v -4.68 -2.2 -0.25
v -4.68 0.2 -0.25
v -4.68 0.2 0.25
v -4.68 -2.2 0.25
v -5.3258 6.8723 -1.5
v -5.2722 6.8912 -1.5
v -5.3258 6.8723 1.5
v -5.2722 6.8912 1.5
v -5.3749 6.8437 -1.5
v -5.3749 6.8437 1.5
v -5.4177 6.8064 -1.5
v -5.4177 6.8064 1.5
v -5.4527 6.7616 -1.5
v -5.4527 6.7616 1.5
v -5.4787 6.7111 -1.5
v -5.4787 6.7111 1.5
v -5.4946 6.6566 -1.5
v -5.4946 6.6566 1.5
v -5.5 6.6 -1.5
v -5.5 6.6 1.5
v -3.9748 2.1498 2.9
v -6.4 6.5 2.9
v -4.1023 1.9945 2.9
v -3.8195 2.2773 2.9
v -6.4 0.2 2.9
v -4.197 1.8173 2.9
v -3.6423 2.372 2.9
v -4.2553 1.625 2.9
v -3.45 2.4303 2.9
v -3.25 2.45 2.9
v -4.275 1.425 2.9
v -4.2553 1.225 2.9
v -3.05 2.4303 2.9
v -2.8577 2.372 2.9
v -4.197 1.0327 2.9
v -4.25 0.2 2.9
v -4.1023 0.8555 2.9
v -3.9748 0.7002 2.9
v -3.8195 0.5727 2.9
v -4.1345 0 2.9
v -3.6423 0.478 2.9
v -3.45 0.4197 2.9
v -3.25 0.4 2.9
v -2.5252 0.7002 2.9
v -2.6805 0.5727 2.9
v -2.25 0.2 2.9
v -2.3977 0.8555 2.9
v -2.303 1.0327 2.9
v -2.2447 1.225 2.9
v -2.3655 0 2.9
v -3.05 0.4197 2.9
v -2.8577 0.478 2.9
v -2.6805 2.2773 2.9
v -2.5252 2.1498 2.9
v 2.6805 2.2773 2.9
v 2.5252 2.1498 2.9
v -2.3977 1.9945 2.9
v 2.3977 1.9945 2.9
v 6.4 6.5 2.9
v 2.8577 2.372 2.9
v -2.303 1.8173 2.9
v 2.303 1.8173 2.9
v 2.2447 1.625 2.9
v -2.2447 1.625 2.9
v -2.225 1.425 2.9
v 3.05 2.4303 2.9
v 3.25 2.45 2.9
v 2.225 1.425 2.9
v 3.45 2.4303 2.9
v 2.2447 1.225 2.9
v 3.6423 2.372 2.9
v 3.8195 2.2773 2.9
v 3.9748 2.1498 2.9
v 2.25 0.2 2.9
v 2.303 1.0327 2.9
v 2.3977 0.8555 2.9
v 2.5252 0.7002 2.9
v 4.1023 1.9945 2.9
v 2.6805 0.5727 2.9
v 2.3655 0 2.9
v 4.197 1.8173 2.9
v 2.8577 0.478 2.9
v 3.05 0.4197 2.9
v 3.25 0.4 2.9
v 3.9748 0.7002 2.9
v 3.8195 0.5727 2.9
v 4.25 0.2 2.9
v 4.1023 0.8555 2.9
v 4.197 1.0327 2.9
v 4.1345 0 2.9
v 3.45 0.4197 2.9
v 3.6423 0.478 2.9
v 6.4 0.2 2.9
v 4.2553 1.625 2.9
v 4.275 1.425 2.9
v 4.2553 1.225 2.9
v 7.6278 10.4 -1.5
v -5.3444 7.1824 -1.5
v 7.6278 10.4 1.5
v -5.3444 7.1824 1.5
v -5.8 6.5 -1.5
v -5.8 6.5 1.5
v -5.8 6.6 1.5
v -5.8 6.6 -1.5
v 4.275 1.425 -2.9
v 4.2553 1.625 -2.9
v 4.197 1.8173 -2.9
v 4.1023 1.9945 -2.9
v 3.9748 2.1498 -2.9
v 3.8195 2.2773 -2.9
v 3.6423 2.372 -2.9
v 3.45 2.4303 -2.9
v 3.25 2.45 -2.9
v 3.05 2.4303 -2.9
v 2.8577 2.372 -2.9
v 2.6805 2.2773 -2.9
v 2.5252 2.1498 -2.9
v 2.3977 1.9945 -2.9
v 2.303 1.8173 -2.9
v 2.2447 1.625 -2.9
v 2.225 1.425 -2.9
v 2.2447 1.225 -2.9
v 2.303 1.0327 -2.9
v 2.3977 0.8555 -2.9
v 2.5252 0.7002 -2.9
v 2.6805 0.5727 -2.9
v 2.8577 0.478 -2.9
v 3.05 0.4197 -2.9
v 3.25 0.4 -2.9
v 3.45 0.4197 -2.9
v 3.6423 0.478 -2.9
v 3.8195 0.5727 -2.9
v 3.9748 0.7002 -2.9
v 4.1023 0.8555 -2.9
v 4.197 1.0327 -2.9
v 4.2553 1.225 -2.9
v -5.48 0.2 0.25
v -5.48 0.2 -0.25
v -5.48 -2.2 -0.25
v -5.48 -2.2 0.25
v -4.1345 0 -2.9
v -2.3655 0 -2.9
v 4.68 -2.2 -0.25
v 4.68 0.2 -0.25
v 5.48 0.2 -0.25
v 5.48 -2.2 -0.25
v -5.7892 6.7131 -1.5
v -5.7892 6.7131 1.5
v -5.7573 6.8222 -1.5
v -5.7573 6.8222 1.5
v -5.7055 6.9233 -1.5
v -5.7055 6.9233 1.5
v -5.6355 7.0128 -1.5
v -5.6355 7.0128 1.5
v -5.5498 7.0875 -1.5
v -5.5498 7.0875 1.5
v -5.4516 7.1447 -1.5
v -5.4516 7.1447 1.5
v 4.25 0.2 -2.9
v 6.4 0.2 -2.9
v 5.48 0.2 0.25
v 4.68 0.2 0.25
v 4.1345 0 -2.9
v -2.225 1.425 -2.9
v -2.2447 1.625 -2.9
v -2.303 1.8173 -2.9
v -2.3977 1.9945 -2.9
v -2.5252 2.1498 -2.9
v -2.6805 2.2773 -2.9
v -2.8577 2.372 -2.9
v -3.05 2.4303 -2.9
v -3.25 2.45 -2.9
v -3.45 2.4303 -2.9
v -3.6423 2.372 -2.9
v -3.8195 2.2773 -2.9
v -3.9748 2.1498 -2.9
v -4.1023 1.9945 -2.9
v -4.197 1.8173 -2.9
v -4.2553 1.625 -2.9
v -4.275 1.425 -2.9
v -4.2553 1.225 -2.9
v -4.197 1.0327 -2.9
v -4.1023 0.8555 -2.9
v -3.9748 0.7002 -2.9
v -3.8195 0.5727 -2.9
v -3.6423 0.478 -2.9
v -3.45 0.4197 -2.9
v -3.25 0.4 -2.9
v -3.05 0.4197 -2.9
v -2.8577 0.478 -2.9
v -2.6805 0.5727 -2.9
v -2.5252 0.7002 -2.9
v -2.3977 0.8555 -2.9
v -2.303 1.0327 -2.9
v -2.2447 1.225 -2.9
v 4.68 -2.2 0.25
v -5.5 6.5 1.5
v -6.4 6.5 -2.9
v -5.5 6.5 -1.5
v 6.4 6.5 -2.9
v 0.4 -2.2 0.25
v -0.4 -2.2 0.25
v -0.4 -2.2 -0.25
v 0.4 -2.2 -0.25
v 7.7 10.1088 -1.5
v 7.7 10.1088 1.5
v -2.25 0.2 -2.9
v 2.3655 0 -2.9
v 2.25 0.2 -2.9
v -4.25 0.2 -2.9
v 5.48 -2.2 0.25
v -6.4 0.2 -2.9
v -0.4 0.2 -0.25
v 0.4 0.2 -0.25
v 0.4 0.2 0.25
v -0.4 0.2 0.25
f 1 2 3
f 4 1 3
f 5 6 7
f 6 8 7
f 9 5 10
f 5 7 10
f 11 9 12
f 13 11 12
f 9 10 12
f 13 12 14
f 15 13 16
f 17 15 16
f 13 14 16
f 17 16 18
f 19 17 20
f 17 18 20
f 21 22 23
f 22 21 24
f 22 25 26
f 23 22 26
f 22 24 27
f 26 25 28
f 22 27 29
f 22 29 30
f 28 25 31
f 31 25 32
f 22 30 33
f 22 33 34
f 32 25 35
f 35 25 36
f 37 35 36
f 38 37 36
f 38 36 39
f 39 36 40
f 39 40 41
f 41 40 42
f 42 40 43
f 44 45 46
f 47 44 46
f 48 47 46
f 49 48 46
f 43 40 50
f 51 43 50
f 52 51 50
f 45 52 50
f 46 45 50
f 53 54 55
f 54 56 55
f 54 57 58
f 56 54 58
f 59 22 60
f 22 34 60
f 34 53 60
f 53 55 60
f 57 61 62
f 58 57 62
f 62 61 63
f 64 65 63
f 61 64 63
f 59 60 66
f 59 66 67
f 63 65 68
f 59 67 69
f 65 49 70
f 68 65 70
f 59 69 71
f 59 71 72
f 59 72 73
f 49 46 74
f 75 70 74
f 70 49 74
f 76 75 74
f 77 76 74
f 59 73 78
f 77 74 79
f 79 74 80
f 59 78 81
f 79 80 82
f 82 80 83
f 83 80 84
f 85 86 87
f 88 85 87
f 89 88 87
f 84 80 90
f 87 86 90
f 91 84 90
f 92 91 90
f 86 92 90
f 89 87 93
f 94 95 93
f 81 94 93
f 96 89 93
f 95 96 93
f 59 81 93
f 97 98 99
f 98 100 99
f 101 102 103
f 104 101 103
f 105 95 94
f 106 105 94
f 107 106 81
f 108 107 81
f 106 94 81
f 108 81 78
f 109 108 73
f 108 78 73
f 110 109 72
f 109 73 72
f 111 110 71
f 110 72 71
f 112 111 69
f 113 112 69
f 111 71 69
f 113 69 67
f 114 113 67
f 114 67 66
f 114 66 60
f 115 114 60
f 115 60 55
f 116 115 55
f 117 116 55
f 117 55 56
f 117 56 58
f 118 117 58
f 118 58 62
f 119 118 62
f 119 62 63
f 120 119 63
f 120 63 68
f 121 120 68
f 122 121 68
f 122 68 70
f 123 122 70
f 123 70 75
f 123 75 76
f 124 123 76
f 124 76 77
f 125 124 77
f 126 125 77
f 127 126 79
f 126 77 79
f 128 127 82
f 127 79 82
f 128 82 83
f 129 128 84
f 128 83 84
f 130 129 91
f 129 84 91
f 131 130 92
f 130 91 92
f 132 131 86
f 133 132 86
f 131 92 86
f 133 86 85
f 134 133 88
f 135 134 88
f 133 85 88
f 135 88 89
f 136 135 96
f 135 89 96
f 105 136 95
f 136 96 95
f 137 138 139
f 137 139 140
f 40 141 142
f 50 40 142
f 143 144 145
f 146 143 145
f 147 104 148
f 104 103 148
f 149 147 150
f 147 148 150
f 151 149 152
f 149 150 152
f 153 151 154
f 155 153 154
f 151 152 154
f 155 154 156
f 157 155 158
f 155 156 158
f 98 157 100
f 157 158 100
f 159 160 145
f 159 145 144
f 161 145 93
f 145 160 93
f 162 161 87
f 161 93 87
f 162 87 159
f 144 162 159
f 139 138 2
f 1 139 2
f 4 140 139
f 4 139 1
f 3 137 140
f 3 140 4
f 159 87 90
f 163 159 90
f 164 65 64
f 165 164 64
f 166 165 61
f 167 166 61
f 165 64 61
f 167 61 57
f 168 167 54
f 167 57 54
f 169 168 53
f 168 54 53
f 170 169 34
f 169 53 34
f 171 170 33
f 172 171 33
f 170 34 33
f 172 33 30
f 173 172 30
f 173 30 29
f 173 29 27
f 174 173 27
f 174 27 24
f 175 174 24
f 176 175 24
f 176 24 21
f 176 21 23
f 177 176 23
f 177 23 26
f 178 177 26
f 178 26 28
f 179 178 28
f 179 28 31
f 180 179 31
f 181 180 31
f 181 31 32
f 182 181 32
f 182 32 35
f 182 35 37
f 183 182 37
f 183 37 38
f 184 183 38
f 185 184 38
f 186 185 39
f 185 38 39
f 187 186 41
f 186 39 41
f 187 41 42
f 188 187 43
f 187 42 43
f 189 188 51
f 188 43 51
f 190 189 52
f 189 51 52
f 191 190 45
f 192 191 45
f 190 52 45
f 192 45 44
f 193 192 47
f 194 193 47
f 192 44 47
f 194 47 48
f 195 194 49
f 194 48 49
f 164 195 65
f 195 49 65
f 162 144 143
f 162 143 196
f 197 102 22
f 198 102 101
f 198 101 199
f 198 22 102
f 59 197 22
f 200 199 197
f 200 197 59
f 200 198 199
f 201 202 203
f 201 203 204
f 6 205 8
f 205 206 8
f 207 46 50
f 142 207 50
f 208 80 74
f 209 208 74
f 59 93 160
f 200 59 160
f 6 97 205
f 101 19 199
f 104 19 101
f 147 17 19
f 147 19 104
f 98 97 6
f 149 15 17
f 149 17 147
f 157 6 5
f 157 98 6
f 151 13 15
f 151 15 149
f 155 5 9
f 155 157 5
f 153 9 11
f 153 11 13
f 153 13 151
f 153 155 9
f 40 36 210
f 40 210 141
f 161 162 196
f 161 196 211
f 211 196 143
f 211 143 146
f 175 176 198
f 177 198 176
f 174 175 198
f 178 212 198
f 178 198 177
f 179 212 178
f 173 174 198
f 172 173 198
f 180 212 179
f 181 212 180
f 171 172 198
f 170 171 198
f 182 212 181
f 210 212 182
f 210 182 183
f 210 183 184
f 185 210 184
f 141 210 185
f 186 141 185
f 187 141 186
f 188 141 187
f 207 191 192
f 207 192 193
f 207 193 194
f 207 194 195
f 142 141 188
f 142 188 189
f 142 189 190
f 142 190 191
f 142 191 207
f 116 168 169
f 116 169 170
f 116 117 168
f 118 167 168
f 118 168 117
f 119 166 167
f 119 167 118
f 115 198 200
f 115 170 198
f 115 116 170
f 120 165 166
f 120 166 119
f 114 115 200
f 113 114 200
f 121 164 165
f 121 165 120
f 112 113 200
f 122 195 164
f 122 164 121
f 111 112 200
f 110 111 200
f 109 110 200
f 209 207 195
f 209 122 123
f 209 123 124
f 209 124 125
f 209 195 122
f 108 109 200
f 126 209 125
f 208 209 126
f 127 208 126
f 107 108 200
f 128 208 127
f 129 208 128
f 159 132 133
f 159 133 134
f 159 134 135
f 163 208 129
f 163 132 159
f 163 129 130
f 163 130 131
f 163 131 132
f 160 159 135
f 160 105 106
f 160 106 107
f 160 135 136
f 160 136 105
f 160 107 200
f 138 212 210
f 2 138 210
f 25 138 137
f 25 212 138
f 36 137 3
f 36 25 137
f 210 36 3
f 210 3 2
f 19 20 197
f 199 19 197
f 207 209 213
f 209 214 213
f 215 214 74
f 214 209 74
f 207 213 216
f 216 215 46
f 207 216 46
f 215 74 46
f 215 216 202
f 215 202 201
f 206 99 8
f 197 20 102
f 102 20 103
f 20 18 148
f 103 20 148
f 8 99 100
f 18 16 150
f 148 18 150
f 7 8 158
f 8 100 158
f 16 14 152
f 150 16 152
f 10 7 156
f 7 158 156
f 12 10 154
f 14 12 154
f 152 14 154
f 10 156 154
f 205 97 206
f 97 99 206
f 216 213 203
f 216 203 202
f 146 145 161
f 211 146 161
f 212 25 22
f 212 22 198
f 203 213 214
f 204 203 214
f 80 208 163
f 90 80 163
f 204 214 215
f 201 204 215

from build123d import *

# Parameters (mm, degrees)
SKETCH1_W           = 12.8
SKETCH1_H           = 5.8
BOSS_EXTRUDE1_DEPTH = 6.5
SKETCH2_R           = 1.025
CUT_EXTRUDE1_DEPTH  = 11.80971785
SKETCH3_W           = 0.8
SKETCH3_H           = 0.5
BOSS_EXTRUDE2_DEPTH = 2.4
BOSS_EXTRUDE3_DEPTH = 1.5


with BuildPart() as part:
    # Sketch1 → Boss-Extrude1 (new body)
    with BuildSketch(Plane(origin=(0, 0, 0), x_dir=(1, 0, 0), z_dir=(0, 1, 0))):
        Rectangle(SKETCH1_W, SKETCH1_H)
    extrude(amount=BOSS_EXTRUDE1_DEPTH)

    # Sketch2 → Cut-Extrude1 (cut, through all)
    with BuildSketch(Plane.XY.offset(2.9)):
        with Locations((-3.25, 1.425)):
            Circle(SKETCH2_R)
        with Locations((3.25, 1.425)):
            Circle(SKETCH2_R)
        Polygon((-6.4, 0.2), (-4.25, 0.2), (-4.134529946, 0), (-6.4, 0), align=None)
        Polygon((4.134529946, 0), (6.4, 0), (6.4, 0.2), (4.25, 0.2), align=None)
        Polygon((2.365470054, 0), (2.25, 0.2), (-2.25, 0.2), (-2.365470054, 0), align=None)
    extrude(amount=-CUT_EXTRUDE1_DEPTH, mode=Mode.SUBTRACT)

    # Sketch3 → Boss-Extrude2 (add)
    with BuildSketch(Plane.XZ.offset(-0.2)):
        Rectangle(SKETCH3_W, SKETCH3_H)
        with Locations((5.08, 0)):
            Rectangle(SKETCH3_W, SKETCH3_H)
        with Locations((-5.08, 0)):
            Rectangle(SKETCH3_W, SKETCH3_H)
    extrude(amount=BOSS_EXTRUDE2_DEPTH)

    # Sketch4 → Boss-Extrude3 (add, symmetric)
    with BuildSketch(Plane.XY):
        with BuildLine():
            Line((-5.8, 6.5), (-5.8, 6.6))
            ThreePointArc((-5.8, 6.6), (-5.672582553, 6.969683285), (-5.344447564, 7.182352901))
            Line((-5.344447564, 7.182352901), (7.627776218, 10.4))
            Line((7.627776218, 10.4), (7.7, 10.108823549))
            Line((7.7, 10.108823549), (-5.272223782, 6.891176451))
            ThreePointArc((-5.272223782, 6.891176451), (-5.436291276, 6.784841642), (-5.5, 6.6))
            Line((-5.5, 6.6), (-5.5, 6.5))
            Line((-5.5, 6.5), (-5.8, 6.5))
        make_face()
    extrude(amount=BOSS_EXTRUDE3_DEPTH, both=True)


solid = part.part
